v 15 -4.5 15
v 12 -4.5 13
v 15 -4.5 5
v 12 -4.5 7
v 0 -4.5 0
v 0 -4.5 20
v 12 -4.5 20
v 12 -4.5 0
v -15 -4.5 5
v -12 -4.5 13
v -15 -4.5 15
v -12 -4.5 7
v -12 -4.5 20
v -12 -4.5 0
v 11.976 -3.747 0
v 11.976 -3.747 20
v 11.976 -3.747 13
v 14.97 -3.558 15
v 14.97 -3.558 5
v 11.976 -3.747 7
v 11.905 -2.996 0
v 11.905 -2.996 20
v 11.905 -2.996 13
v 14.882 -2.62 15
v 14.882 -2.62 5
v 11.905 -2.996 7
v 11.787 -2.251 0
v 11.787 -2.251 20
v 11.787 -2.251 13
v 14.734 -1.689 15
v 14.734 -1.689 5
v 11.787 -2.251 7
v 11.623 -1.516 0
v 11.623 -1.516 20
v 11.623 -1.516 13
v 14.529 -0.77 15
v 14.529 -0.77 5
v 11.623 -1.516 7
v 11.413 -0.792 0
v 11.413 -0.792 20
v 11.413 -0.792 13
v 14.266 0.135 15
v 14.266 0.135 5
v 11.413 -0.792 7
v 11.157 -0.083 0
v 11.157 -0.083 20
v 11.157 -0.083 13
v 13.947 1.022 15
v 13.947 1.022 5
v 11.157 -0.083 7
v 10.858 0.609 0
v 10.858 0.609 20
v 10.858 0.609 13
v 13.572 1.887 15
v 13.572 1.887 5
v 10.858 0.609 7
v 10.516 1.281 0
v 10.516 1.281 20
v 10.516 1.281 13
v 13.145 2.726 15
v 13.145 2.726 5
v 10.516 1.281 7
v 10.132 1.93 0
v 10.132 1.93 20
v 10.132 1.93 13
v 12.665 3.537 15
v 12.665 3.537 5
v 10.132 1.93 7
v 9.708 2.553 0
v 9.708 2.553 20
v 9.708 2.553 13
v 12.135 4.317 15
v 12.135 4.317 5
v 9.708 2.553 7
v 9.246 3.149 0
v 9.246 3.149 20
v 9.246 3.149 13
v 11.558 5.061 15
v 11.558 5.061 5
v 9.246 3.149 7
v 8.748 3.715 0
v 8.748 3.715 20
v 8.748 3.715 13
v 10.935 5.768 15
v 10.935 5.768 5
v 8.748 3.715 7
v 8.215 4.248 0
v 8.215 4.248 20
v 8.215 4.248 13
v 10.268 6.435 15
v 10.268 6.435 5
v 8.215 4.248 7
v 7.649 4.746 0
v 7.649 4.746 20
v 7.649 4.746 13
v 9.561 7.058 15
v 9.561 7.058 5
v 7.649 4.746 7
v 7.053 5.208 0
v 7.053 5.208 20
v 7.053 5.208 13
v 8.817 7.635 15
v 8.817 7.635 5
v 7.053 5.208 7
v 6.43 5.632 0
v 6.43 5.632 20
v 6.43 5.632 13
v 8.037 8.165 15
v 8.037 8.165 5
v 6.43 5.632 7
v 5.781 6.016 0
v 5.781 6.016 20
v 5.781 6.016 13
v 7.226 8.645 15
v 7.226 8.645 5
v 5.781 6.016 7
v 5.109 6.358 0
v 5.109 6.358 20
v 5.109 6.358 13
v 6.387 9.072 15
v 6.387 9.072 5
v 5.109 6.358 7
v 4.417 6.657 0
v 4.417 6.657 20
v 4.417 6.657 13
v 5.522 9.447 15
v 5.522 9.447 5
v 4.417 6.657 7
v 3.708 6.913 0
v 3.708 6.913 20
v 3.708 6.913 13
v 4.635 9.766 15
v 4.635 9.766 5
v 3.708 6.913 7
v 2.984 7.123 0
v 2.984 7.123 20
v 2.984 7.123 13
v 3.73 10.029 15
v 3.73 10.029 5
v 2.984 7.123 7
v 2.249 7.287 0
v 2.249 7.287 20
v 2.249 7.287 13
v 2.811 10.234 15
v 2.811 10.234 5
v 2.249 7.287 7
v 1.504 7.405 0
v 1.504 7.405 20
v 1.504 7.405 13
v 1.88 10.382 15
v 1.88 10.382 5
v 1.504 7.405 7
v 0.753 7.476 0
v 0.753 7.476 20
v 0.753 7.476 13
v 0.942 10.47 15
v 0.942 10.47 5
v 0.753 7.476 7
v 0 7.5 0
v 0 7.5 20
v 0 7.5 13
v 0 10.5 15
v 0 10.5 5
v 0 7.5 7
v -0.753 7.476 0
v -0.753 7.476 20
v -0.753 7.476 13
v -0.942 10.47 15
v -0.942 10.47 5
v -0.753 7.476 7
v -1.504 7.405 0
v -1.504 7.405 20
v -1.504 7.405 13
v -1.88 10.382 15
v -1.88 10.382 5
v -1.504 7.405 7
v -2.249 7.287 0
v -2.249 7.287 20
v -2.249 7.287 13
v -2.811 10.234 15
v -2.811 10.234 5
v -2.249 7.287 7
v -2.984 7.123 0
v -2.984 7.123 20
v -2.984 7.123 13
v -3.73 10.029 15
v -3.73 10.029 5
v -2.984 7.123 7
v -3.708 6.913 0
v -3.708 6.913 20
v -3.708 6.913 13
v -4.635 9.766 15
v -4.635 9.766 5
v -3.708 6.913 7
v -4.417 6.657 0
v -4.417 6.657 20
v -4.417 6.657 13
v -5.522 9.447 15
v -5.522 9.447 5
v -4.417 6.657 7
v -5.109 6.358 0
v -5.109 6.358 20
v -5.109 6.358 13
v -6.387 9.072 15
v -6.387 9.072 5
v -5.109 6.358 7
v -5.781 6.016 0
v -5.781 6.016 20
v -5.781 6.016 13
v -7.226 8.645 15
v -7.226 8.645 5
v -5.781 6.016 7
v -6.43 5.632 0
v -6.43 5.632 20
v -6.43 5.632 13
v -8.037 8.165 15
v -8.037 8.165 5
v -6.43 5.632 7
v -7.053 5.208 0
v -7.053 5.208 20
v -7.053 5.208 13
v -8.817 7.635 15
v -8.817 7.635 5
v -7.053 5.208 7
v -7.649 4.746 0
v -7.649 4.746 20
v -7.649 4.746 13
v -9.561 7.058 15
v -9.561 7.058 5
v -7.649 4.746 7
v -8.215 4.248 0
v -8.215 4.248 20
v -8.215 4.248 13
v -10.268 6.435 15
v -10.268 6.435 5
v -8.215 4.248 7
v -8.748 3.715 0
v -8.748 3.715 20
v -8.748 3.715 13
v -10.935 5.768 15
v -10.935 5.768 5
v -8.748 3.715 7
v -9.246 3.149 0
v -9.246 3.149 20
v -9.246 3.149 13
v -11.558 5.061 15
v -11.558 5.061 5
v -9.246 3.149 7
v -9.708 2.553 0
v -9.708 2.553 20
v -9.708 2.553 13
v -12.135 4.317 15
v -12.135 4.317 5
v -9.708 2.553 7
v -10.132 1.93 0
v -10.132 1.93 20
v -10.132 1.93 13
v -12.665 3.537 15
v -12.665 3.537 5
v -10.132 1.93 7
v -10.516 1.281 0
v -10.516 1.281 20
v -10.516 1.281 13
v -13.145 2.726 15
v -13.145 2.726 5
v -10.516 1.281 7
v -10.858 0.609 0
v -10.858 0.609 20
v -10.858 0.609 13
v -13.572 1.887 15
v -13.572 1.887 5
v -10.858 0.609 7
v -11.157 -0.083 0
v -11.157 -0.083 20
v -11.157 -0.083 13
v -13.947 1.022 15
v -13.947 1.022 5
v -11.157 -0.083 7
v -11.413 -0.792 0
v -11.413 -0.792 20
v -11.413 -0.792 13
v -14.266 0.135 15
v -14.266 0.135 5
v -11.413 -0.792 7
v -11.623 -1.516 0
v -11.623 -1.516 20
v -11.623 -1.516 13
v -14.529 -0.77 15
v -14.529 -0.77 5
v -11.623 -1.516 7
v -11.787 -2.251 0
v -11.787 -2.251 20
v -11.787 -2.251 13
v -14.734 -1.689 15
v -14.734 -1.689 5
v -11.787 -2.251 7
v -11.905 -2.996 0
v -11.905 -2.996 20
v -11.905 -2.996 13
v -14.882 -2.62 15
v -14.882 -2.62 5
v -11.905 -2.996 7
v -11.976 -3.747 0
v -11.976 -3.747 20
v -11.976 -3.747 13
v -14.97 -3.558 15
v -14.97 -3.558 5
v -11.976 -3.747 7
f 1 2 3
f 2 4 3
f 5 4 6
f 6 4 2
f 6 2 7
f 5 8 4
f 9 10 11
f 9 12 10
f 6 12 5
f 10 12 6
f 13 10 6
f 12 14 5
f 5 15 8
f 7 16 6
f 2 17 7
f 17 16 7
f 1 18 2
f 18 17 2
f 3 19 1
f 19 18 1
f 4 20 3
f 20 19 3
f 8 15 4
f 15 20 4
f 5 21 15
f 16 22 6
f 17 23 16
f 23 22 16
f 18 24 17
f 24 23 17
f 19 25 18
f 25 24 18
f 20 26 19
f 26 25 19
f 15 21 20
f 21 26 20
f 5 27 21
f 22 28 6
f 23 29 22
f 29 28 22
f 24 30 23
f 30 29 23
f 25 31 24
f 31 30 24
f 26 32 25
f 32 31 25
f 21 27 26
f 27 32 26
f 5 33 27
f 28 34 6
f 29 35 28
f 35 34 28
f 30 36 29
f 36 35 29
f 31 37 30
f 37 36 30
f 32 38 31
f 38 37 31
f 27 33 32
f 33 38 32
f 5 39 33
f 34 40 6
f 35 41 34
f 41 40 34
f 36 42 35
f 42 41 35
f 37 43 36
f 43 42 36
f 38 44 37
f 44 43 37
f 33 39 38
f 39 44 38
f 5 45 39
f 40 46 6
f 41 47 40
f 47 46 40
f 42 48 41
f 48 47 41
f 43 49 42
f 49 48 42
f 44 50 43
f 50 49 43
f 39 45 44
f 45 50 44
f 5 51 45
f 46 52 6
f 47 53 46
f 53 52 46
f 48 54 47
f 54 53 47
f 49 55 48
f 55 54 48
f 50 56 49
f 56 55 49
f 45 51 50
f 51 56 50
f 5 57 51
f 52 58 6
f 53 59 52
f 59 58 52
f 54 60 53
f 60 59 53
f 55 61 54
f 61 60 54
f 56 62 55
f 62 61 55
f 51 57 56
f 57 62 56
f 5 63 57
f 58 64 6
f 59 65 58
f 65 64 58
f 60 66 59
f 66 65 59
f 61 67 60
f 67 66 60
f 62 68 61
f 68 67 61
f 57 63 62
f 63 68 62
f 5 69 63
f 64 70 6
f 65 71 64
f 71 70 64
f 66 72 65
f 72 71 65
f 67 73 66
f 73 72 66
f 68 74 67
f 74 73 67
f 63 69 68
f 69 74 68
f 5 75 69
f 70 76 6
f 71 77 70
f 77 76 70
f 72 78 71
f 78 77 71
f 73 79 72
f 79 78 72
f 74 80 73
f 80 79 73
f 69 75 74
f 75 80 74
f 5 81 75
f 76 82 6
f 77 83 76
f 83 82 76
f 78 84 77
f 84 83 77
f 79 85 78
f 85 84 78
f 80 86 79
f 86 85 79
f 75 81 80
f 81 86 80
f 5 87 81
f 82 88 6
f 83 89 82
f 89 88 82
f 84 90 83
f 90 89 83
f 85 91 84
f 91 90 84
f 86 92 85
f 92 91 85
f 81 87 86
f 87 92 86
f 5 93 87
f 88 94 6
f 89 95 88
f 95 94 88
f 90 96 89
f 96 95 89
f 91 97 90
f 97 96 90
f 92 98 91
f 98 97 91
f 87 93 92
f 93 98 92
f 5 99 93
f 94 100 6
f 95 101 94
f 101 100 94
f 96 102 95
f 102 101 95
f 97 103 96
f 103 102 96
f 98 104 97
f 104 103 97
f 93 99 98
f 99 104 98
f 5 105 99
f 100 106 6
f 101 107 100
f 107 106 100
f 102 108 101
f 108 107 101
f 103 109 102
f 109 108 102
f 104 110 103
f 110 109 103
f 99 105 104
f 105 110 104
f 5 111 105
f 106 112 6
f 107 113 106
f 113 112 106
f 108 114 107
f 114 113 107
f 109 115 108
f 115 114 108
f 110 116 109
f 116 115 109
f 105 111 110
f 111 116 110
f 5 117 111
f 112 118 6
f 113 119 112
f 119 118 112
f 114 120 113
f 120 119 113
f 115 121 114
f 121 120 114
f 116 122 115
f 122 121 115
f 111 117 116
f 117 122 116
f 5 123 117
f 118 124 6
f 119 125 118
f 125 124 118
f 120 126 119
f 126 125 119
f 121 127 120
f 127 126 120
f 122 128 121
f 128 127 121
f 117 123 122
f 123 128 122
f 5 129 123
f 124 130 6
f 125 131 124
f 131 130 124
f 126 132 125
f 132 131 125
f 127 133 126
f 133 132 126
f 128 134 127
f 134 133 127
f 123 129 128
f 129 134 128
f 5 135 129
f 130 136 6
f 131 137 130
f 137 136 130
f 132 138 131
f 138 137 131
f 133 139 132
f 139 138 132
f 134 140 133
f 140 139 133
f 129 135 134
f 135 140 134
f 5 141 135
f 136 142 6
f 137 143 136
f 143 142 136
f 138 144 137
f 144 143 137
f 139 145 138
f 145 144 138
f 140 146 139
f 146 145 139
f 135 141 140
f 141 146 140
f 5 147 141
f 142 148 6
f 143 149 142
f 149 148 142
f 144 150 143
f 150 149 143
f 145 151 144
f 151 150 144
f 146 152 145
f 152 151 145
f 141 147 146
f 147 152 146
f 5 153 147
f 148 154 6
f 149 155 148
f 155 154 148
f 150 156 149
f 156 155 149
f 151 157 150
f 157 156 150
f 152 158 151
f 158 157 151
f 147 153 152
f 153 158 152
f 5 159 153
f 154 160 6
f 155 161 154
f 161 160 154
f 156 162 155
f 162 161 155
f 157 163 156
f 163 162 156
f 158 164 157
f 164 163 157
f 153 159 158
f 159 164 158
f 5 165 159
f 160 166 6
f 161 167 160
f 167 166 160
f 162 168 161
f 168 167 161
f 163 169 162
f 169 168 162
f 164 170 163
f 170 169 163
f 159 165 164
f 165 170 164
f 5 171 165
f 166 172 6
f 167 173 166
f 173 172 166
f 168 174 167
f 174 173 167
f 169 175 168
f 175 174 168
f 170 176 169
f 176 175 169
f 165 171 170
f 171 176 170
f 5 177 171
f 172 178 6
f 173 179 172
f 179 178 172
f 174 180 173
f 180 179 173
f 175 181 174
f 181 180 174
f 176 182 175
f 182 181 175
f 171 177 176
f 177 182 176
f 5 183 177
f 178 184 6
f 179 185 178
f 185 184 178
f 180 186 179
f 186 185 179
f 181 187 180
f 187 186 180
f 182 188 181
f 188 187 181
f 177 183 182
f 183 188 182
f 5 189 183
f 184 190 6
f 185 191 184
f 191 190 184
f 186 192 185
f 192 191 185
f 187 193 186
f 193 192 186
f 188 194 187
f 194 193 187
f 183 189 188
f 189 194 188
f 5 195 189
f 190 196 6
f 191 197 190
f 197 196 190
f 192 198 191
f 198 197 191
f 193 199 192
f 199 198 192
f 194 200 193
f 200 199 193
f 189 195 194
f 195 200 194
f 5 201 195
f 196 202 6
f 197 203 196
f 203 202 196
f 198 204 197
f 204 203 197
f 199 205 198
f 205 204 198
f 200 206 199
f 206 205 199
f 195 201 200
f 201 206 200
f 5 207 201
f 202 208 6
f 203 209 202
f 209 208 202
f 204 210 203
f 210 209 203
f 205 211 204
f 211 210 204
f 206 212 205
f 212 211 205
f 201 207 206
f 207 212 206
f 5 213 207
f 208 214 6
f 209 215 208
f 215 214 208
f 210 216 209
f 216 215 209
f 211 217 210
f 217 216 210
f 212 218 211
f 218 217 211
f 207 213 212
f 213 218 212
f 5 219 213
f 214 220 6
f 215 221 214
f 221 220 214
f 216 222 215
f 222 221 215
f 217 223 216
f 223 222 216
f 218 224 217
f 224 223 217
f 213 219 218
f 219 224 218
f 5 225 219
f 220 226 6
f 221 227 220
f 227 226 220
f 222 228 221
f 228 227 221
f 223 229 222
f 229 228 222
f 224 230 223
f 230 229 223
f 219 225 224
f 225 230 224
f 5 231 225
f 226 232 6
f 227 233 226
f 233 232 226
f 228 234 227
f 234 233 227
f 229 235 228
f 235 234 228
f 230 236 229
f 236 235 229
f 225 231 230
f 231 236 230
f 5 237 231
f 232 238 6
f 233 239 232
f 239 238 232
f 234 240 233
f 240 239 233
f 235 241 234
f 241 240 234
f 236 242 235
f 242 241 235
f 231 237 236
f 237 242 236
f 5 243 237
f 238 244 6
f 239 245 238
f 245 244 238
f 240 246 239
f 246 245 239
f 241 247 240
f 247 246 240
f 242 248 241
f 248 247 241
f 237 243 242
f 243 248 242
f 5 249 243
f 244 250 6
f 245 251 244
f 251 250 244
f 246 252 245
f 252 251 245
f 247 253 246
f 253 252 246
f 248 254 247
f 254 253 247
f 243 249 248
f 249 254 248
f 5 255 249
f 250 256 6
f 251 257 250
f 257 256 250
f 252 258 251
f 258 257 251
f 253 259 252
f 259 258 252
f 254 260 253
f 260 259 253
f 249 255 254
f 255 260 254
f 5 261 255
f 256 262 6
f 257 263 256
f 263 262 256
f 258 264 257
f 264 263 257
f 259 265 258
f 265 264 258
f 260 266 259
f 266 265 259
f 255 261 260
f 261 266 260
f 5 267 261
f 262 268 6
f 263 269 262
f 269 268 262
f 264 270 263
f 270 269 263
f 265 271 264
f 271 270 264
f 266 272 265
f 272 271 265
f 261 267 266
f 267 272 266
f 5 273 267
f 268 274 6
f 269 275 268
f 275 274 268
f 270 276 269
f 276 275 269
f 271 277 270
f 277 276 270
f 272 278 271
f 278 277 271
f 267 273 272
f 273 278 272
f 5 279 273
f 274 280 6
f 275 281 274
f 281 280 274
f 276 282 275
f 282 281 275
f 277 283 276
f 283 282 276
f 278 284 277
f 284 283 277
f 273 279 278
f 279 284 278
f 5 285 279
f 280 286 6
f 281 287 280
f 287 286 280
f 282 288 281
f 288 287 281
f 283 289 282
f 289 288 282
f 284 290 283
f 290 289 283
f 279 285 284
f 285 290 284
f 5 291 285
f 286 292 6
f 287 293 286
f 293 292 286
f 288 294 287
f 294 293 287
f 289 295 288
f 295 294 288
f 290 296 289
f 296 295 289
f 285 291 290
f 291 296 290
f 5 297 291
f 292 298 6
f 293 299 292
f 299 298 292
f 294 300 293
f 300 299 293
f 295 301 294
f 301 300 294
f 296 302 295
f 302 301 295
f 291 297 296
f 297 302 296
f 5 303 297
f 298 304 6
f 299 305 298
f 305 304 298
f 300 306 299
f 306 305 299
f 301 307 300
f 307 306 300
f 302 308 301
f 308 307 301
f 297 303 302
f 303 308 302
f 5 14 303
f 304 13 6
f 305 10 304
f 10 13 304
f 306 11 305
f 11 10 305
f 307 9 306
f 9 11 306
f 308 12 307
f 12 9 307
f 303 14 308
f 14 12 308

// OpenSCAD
$fn = 100;

PRINT_WHOLE = true;

PRINT_TOP_ARCH = false;

SEGMENT_HT = 20;
TAIL_WD = 10;
TAIL_HT = 3;
TOOTH_BITE = 2;
// TAIL_CLEARANCE = 2;


// have decided 18,36,72
NOMINAL_SEGMENT_RAD = 18;
// NOMINAL_SEGMENT_RAD = 36;
// NOMINAL_SEGMENT_RAD = 72;



segment_rad = NOMINAL_SEGMENT_RAD - 2*TAIL_HT;



rotating_segment_shape =[
    [0,0],
    [0,SEGMENT_HT],
    [segment_rad,           SEGMENT_HT],
    [segment_rad,           SEGMENT_HT/2 + (TAIL_WD/2 - TOOTH_BITE)],
    [segment_rad + TAIL_HT, SEGMENT_HT/2 + TAIL_WD/2],
    [segment_rad + TAIL_HT, SEGMENT_HT/2 - TAIL_WD/2],
    [segment_rad,           SEGMENT_HT/2 - (TAIL_WD/2 - TOOTH_BITE)],
    [segment_rad,0]
];


FAN_VERTICAL_OS = 0.5;
MAIN_OS = 0.2;
RADIUS_OS = 0.2;
BULGE_SZ = 0.5;
// the next rad needs to be half minus the tails
nominal_neg_rad = NOMINAL_SEGMENT_RAD/2;


// if (NOMINAL_SEGMENT_RAD > 18){
//     neg_segment_rad = nominal_neg_rad - 2*TAIL_HT; 
// }else{
//     neg_segment_rad = nominal_neg_rad - 2*TAIL_HT - 4*BULGE_SZ;
// }

neg_segment_rad = NOMINAL_SEGMENT_RAD > 18 ? nominal_neg_rad - 2*TAIL_HT : 
                                            nominal_neg_rad - 2*TAIL_HT - 3*BULGE_SZ;


module negative_segment(){
    negative_segment_shape = [
        [0,- MAIN_OS],
        [0,SEGMENT_HT + MAIN_OS],
        [neg_segment_rad,           SEGMENT_HT + MAIN_OS],
        [neg_segment_rad,           SEGMENT_HT/2 + (TAIL_WD/2 - TOOTH_BITE + MAIN_OS)],
        [neg_segment_rad + TAIL_HT, SEGMENT_HT/2 + TAIL_WD/2 + FAN_VERTICAL_OS+ MAIN_OS],
        [neg_segment_rad + TAIL_HT + BULGE_SZ, SEGMENT_HT/2],
        [neg_segment_rad + TAIL_HT, SEGMENT_HT/2 - TAIL_WD/2 - FAN_VERTICAL_OS - MAIN_OS],
        [neg_segment_rad,           SEGMENT_HT/2 - (TAIL_WD/2 - TOOTH_BITE + MAIN_OS)],
        [neg_segment_rad,- MAIN_OS]
    ];
    rotate_extrude(angle=180, convexity=10){
        polygon(negative_segment_shape);
    }
}




// because we can't print this as is we need to chop it in half
// 3/8 * nom rad for half printing
// 

module full_segment(){
    difference(){
        difference(){
            //  chop off the bottom of the half-circle
            translate([0, -NOMINAL_SEGMENT_RAD/4, 0]){
                rotate_extrude(angle=180, convexity=10){
                    polygon(rotating_segment_shape);
                }
            }
            // translate([0, -segment_rad/2, 10]){
            //     cube([2.1 * segment_rad+2*TAIL_HT, segment_rad, SEGMENT_HT *1.5], 
            //             center=true);
            // }
        }
        
        if (NOMINAL_SEGMENT_RAD > 18){
            
            HORIZ_COEFF = 0.54;
            VERT_COEFF = 1.4;
            translate([-segment_rad*HORIZ_COEFF ,-neg_segment_rad*VERT_COEFF , 0]){
                negative_segment();
            }
            translate([segment_rad*HORIZ_COEFF,-neg_segment_rad*VERT_COEFF , 0]){
                negative_segment();
            }
        }
        // translate([-segment_rad*0.54 ,-neg_segment_rad*1.4 , 0]){
        //     negative_segment();
        // }
        // translate([segment_rad*0.54,-neg_segment_rad*1.4 , 0]){
        //     negative_segment();
        // }
    }
}

chop_ht = 2/8 * NOMINAL_SEGMENT_RAD;

module chopping_cube(){
    translate([-NOMINAL_SEGMENT_RAD, 
                chop_ht, -0.1]){
        cube([2 * NOMINAL_SEGMENT_RAD, segment_rad, SEGMENT_HT *1.5], 
                center=false);
    }
}

module register_spike(){
    rotate([-90, 0, 0]){
        hull(){
            translate([0, 0, 6]){
                cube([2,2,0.1], center=true);
            }
            cube([3,3,0.1], center=true);
        }
    }
}


module register_spikes(){
    translate([segment_rad*(1/4), chop_ht -1, SEGMENT_HT/2]){
        register_spike();
    }
    translate([-segment_rad*(1/4), chop_ht -1, SEGMENT_HT/2]){
        register_spike();
    }
}
    



// register_spike();


if (PRINT_WHOLE){
    intersection(){
        full_segment();

        // translate([-37, 0, 0]){
        //     cylinder(r=segment_rad/2.5, h=SEGMENT_HT *1.5, center=false);
        // }
    }
}else{

    if (PRINT_TOP_ARCH){
        difference(){
            intersection(){
                full_segment();
                chopping_cube();
            }
            full_segment();
            register_spikes();
        }
        
    }else{
        difference(){
            full_segment();
            chopping_cube();
        }

        register_spikes();
        
    }
}
